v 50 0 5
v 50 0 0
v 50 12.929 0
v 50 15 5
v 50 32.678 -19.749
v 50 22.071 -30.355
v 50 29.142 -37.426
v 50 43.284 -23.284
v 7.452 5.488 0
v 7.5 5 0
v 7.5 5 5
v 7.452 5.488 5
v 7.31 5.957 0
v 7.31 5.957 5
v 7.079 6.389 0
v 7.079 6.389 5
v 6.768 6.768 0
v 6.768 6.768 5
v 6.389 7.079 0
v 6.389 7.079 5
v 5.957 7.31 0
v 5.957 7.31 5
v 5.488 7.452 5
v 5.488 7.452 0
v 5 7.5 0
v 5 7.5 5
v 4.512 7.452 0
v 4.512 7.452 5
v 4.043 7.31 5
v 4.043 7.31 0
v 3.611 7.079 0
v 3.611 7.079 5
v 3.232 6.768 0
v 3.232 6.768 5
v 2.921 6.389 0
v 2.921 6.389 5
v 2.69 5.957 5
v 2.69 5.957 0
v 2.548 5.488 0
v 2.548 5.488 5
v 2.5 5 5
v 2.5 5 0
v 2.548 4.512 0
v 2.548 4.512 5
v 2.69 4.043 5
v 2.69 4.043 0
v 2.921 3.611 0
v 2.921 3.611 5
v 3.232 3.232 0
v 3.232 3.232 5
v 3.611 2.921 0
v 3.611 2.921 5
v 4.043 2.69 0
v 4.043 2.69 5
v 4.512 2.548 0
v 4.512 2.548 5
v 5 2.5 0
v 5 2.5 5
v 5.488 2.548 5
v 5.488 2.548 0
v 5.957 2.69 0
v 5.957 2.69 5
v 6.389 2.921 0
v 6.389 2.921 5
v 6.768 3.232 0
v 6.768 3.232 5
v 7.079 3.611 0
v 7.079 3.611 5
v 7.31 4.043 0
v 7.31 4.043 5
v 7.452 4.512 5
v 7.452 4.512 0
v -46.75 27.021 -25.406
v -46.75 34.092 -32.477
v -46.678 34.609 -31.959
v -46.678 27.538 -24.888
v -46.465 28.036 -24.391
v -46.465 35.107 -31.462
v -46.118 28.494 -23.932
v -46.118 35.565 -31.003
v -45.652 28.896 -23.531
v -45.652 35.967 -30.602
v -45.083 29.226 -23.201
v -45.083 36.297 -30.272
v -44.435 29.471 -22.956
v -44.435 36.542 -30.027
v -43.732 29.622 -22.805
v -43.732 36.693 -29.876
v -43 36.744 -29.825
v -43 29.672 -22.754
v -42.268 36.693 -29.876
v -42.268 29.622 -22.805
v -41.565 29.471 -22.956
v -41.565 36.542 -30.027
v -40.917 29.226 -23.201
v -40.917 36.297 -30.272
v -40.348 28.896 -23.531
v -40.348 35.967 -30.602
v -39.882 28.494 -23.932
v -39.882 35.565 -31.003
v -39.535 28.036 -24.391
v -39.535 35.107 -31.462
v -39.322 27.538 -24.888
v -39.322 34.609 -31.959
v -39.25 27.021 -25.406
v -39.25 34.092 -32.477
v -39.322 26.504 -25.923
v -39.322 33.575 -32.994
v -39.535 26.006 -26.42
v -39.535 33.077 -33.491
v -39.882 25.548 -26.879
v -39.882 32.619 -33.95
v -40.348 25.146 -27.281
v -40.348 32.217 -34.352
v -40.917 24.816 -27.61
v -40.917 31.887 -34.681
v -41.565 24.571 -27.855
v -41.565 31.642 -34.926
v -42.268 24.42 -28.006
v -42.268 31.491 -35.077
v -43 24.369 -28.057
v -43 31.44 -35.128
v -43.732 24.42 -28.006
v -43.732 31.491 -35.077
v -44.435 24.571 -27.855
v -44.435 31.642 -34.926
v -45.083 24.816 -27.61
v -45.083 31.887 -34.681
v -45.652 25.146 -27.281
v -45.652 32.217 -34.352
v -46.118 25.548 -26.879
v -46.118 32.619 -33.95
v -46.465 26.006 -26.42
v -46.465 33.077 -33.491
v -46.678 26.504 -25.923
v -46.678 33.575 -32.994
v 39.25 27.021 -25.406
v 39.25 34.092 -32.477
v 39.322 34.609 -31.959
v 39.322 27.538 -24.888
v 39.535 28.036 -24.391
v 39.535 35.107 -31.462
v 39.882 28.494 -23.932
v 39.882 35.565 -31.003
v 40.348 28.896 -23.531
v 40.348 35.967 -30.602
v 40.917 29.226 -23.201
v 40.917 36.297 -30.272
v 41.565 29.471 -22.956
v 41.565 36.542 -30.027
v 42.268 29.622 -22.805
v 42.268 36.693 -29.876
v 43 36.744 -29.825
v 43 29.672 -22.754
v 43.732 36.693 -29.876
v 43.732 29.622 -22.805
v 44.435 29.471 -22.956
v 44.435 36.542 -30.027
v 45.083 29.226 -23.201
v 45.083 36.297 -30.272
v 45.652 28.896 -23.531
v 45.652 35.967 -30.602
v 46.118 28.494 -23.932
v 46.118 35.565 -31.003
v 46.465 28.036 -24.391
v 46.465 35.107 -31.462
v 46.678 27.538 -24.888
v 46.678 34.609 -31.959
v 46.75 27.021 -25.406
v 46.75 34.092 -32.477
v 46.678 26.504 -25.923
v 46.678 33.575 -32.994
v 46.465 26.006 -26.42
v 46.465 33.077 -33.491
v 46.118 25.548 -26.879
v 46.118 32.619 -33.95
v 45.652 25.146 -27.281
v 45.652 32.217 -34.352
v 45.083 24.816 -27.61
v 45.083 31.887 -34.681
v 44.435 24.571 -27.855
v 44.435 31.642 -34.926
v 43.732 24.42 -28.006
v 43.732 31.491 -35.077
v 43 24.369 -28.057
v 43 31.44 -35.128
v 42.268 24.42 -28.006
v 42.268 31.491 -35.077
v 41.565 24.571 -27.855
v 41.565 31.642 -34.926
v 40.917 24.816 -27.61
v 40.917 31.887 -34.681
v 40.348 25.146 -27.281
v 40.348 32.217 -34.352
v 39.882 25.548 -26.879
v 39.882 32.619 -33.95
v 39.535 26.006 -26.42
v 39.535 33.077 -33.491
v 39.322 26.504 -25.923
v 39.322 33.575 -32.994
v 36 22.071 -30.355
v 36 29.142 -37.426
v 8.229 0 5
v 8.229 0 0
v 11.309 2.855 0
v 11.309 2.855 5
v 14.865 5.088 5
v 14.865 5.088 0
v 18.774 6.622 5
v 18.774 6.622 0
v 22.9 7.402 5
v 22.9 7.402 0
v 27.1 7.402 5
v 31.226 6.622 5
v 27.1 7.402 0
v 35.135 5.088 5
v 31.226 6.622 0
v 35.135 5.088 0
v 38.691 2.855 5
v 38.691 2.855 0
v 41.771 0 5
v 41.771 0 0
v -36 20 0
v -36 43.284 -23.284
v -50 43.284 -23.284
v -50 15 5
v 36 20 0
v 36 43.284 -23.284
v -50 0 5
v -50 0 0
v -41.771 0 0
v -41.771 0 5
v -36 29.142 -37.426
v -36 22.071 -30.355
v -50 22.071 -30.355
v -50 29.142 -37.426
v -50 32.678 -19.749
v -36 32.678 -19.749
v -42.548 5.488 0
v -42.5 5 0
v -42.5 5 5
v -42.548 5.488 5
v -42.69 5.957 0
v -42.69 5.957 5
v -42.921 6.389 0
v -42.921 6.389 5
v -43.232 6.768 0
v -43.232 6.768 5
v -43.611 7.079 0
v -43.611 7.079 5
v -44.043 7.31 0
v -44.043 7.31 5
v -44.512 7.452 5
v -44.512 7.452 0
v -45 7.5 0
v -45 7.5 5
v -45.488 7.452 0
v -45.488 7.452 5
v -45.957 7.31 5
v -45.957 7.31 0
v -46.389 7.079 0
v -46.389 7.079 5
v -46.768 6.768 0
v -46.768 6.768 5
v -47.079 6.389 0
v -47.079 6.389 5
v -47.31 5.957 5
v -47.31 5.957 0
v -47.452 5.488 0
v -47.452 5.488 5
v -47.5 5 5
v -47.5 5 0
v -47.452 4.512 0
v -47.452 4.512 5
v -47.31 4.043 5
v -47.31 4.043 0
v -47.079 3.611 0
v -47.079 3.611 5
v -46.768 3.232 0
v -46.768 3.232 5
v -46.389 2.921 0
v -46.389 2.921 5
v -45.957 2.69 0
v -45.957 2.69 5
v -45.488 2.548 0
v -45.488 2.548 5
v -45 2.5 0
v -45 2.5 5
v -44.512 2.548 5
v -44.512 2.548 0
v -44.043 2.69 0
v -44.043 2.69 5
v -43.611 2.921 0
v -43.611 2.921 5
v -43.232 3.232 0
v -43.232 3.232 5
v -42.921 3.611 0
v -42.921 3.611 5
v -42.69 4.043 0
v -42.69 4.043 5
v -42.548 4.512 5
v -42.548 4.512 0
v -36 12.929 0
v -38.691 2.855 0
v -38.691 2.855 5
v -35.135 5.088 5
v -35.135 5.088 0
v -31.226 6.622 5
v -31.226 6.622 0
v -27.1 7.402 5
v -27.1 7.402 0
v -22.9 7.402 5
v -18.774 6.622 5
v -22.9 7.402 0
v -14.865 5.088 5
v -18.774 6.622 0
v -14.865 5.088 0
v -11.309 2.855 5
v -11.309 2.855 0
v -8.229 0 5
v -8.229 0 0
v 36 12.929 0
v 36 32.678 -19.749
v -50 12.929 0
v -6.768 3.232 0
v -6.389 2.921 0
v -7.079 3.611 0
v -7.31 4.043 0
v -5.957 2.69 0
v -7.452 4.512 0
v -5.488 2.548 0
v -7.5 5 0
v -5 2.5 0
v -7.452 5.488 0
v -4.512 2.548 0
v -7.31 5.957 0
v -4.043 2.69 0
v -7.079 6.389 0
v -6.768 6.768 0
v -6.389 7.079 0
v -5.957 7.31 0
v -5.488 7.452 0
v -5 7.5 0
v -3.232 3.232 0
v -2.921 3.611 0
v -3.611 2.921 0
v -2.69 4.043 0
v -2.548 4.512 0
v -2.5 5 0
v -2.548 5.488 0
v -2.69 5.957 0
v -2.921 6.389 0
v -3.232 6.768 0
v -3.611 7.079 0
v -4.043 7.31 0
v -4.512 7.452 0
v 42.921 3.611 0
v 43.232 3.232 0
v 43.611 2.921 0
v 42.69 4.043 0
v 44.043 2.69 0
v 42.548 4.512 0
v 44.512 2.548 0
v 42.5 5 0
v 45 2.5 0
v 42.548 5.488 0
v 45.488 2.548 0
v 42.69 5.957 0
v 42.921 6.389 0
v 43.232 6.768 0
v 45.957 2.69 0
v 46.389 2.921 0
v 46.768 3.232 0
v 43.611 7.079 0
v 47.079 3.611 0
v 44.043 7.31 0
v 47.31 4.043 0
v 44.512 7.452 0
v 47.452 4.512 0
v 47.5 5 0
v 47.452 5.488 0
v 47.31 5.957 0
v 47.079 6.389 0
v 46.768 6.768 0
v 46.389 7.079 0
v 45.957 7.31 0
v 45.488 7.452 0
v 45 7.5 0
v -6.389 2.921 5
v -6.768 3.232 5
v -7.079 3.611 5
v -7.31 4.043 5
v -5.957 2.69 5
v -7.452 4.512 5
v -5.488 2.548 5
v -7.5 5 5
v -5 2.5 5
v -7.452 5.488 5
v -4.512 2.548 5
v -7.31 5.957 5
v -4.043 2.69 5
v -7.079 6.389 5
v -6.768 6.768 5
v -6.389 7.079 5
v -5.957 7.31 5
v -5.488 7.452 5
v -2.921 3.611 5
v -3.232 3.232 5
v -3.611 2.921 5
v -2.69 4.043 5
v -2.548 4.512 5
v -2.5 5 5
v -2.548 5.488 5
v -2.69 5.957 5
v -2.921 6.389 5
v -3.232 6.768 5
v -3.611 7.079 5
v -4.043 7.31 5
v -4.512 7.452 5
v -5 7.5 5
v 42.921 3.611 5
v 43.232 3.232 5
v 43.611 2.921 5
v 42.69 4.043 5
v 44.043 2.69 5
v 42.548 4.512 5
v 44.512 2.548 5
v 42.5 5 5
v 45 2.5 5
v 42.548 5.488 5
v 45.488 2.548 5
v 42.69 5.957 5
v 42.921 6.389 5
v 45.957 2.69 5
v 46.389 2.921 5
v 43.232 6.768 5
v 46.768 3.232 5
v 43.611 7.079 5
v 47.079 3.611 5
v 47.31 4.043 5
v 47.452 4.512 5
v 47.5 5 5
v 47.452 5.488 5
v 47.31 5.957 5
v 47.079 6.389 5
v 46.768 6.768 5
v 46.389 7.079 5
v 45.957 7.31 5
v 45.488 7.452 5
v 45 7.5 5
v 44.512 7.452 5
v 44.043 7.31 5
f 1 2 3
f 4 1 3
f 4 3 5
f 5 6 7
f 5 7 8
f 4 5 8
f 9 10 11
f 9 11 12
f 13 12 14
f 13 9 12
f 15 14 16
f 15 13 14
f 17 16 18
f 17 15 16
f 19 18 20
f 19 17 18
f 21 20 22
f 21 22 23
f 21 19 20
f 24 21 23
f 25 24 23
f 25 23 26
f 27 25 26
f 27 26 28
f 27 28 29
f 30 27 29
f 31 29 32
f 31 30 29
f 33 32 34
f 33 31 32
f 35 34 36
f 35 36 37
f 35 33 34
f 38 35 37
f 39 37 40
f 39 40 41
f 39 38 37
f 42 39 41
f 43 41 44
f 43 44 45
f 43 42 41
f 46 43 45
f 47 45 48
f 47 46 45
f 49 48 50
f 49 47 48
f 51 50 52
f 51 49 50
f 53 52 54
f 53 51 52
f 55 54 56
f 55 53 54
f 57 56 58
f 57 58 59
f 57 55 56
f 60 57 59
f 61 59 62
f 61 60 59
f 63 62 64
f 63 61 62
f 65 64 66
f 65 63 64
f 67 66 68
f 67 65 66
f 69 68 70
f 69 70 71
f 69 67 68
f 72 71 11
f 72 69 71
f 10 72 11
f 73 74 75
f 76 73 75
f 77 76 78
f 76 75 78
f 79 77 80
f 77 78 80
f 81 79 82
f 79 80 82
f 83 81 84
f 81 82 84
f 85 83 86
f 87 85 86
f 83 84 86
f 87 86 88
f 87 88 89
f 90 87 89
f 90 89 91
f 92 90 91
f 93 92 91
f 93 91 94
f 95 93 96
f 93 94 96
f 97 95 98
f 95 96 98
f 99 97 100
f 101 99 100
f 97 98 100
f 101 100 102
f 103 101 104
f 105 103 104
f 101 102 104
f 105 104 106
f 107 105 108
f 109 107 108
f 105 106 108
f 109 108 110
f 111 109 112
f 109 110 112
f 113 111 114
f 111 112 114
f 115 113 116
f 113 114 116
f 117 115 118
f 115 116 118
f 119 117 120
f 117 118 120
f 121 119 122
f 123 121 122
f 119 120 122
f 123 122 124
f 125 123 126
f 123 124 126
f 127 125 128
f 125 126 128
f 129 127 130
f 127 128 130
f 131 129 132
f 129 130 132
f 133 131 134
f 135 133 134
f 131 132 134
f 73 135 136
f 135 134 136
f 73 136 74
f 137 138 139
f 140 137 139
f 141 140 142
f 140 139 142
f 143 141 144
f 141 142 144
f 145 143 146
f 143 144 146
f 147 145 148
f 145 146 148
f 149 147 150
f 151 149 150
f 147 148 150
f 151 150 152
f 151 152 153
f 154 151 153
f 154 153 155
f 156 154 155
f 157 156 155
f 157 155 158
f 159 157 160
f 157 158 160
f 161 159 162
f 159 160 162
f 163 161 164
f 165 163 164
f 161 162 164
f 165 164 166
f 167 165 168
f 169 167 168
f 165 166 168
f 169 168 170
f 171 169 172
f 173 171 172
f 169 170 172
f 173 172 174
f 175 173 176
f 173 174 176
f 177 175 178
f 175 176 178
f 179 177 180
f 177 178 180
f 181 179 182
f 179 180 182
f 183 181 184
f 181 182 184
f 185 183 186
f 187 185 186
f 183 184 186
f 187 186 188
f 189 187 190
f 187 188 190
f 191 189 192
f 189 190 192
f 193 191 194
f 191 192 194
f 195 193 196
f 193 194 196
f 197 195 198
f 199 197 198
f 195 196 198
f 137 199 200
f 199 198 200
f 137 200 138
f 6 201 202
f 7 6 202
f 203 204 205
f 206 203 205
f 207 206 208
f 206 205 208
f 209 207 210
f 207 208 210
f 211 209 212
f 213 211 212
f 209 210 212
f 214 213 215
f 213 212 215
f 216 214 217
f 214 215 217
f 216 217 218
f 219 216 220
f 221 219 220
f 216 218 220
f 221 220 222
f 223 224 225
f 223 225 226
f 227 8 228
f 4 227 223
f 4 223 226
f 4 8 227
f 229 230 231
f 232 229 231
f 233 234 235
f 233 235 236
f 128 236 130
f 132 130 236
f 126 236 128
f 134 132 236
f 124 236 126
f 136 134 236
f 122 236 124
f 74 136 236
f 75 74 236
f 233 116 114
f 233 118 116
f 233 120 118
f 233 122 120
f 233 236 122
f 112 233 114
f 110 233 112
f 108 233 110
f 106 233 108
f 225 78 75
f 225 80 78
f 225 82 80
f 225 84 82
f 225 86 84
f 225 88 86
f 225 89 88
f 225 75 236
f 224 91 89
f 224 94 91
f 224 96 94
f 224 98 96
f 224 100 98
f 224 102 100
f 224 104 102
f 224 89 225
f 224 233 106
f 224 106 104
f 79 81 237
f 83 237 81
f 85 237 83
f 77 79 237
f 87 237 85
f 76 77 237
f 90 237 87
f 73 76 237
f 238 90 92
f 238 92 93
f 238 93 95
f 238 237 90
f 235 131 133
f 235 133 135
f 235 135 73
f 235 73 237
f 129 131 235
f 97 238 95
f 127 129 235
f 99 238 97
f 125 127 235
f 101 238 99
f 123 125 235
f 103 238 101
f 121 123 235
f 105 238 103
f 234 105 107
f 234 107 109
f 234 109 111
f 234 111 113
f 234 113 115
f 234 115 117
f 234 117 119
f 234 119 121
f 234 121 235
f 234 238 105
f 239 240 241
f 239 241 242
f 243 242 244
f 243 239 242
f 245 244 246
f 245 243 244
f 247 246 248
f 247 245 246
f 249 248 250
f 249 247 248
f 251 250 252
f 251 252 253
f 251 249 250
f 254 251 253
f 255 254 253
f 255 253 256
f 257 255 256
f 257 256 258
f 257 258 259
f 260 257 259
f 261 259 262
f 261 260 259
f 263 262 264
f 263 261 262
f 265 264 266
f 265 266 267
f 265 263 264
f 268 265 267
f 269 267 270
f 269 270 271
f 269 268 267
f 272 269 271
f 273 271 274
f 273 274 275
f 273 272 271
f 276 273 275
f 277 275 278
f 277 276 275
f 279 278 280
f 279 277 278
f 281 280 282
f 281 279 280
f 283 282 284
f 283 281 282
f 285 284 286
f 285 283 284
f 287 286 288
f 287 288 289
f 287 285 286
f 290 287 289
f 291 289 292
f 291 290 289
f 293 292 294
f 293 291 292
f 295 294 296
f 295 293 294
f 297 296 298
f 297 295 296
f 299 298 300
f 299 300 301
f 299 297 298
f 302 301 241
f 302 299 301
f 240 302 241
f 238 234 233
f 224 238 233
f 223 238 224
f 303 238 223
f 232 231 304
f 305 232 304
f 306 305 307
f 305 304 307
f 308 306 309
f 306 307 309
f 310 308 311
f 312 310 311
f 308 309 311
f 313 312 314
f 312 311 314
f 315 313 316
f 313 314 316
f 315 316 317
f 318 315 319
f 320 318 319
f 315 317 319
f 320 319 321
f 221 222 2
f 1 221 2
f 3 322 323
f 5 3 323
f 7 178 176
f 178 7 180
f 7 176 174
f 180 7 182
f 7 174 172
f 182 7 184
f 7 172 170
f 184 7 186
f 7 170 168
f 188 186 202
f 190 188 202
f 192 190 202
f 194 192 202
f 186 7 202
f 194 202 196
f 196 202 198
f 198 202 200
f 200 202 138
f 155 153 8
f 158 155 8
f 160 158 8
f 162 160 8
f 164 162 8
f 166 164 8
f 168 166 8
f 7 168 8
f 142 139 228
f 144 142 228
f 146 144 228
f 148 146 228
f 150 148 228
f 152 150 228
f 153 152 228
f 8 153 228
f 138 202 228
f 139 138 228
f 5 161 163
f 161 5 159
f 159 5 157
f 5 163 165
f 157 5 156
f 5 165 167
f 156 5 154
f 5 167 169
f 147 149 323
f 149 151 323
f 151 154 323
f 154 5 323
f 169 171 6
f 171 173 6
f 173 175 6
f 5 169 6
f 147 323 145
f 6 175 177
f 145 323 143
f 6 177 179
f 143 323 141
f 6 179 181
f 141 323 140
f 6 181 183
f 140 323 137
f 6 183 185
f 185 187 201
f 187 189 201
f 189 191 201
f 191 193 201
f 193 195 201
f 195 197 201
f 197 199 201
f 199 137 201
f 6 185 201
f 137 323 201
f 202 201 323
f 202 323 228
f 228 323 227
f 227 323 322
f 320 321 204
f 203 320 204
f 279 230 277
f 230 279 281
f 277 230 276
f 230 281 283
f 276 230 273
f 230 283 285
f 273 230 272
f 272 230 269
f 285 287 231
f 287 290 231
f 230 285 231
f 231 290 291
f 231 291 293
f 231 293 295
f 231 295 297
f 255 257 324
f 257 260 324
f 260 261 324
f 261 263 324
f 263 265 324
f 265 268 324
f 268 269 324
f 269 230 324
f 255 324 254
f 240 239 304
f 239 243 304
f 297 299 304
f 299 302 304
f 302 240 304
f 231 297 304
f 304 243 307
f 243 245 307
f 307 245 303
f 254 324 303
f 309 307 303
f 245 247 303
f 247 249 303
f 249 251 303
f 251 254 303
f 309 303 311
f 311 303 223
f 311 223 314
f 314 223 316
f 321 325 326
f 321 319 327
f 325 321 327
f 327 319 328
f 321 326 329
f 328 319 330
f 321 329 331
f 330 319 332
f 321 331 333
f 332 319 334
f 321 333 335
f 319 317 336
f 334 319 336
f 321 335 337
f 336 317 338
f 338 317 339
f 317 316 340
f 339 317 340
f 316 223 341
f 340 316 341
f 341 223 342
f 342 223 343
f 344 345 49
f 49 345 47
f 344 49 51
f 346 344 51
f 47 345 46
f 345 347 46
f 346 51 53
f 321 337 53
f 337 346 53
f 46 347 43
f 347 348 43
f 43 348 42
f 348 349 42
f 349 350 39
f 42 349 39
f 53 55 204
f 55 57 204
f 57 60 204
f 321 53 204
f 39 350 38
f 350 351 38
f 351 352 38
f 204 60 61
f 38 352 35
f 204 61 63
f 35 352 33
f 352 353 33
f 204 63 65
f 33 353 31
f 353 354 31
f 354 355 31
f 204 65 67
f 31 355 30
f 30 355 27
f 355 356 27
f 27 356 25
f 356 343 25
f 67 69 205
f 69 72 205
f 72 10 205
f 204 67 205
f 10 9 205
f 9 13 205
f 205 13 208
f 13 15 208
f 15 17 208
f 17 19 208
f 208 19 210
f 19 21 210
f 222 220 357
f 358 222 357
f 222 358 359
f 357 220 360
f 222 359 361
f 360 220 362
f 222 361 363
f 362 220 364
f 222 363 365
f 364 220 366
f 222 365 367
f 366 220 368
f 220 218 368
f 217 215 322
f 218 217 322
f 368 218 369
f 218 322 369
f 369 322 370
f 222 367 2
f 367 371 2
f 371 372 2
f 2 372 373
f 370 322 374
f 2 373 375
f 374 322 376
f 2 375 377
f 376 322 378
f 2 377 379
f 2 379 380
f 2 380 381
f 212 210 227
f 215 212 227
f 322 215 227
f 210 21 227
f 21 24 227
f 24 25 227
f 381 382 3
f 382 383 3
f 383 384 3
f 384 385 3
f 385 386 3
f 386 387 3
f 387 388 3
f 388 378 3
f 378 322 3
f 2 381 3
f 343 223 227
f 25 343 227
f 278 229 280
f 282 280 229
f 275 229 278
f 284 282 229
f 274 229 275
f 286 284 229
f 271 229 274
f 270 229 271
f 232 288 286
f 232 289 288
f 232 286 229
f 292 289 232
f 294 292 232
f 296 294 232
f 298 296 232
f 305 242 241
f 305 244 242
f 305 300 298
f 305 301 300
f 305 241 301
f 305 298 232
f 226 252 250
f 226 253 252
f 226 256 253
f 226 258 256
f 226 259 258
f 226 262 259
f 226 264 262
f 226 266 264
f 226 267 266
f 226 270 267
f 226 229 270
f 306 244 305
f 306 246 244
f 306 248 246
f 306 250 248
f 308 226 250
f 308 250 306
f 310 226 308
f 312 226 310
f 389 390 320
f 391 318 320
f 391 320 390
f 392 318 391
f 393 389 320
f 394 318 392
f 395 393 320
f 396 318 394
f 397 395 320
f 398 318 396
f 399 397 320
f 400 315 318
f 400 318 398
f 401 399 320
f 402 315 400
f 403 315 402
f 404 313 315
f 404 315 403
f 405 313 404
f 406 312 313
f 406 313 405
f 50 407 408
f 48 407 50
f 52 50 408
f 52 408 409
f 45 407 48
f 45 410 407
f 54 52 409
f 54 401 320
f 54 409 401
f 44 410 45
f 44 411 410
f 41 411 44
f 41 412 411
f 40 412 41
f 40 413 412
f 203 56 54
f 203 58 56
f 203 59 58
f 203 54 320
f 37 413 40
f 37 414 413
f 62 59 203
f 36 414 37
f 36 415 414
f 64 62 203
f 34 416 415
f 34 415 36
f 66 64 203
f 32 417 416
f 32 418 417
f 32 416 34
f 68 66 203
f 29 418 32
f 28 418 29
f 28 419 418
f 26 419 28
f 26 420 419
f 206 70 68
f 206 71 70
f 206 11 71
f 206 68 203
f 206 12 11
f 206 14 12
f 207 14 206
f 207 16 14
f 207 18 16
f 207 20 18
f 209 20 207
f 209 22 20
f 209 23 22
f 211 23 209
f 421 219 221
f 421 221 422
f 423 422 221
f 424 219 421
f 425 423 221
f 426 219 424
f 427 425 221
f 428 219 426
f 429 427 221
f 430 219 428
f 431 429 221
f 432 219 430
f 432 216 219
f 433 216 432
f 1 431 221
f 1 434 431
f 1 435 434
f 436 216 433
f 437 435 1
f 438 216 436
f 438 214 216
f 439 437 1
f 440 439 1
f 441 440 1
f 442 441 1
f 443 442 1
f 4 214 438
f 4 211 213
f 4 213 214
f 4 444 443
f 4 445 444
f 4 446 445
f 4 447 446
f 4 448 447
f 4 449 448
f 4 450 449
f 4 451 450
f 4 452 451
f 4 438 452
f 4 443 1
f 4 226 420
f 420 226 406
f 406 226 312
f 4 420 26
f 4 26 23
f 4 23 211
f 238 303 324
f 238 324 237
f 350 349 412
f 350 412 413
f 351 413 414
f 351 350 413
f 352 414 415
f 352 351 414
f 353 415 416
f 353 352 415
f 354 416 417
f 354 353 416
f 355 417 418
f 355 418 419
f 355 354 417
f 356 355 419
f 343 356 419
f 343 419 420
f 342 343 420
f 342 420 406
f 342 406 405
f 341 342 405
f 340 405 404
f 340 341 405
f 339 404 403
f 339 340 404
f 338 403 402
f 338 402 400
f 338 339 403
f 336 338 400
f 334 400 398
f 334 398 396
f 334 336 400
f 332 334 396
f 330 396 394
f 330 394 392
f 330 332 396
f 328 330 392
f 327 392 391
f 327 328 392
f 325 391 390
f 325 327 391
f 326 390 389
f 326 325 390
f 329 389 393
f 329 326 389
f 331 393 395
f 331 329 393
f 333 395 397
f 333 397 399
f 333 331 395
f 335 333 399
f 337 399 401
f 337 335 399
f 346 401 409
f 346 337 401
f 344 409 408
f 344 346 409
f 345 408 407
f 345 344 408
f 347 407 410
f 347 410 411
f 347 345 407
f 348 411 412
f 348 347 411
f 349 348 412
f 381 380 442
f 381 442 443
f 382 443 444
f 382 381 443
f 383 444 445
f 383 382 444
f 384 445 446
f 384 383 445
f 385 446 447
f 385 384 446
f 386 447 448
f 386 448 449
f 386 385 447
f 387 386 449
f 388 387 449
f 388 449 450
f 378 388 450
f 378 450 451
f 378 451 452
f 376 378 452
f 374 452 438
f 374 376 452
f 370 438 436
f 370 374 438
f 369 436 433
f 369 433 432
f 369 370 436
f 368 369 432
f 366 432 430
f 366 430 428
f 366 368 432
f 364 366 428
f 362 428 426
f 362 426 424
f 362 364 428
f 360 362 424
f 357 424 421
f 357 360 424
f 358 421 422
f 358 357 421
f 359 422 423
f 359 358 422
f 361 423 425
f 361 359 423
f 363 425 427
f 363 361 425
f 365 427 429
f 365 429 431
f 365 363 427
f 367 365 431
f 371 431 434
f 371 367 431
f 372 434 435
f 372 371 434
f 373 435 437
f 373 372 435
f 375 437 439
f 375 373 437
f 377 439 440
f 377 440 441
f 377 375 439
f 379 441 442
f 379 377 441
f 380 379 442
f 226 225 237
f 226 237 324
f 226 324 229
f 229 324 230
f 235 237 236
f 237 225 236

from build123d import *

# Parameters (mm, degrees)
F0_R     = 2.5
F0_W     = 100
F0_H     = 5
F1_DEPTH = 5
F3_START = 36
F3_DEPTH = 14
F4_START = -36
F4_DEPTH = 14
F5_R     = 3.75
F6_DEPTH = 10
F8_DEPTH = 50


with BuildPart() as f1:
    # F0 (on Top) → F1 (new body)
    with BuildSketch(Plane.XY):
        with BuildLine():
            Line((50, 10), (-50, 10))
            Line((-50, 10), (-50, 0))
            Line((-50, 0), (-41.7705098312, 0))
            ThreePointArc((-41.7705098312, 0), (-25, 7.5), (-8.2294901688, 0))
            Line((-8.2294901688, 0), (8.2294901688, 0))
            ThreePointArc((8.2294901688, 0), (25, 7.5), (41.7705098312, 0))
            Line((41.7705098312, 0), (50, 0))
            Line((50, 0), (50, 10))
        make_face()
        with Locations((-45, 5)):
            Circle(F0_R, mode=Mode.SUBTRACT)
        with Locations((-5, 5)):
            Circle(F0_R, mode=Mode.SUBTRACT)
        with Locations((5, 5)):
            Circle(F0_R, mode=Mode.SUBTRACT)
        with Locations((45, 5)):
            Circle(F0_R, mode=Mode.SUBTRACT)
        with Locations((0, 12.5)):
            Rectangle(F0_W, F0_H)
    extrude(amount=F1_DEPTH)

    # F2 (on Right) → F3 (join)
    with BuildSketch(Plane.YZ.offset(F3_START)):
        Polygon((36.2132034356, -16.2132034356), (15, 5), (12.9289321881, 0), (32.6776695297, -19.7487373415), align=None)
        Polygon((43.2842712475, -23.2842712475), (36.2132034356, -16.2132034356), (32.6776695297, -19.7487373415), (22.0710678119, -30.3553390593), (29.1421356237, -37.4264068712), align=None)
    extrude(amount=F3_DEPTH)

    # F2 (on Right) → F4 (join)
    with BuildSketch(Plane.YZ.offset(F4_START)):
        Polygon((36.2132034356, -16.2132034356), (15, 5), (12.9289321881, 0), (32.6776695297, -19.7487373415), align=None)
        Polygon((43.2842712475, -23.2842712475), (36.2132034356, -16.2132034356), (32.6776695297, -19.7487373415), (22.0710678119, -30.3553390593), (29.1421356237, -37.4264068712), align=None)
    extrude(amount=-F4_DEPTH)

    # F5 (on face) → F6 (cut)
    with BuildSketch(Plane(origin=(0, 33.2842712475, -33.2842712475), x_dir=(-1, 0, 0), z_dir=(0, 0.7071067812, -0.7071067812))):
        with Locations((43, 1.1421356237)):
            Circle(F5_R)
        with Locations((-43, 1.1421356237)):
            Circle(F5_R)
    extrude(amount=-F6_DEPTH, mode=Mode.SUBTRACT)

    # F7 (on Right) → F8 (join, symmetric)
    with BuildSketch(Plane.YZ):
        Polygon((20, 0), (15, 5), (15, 0), align=None)
    extrude(amount=F8_DEPTH, both=True)


solid = f1.part
